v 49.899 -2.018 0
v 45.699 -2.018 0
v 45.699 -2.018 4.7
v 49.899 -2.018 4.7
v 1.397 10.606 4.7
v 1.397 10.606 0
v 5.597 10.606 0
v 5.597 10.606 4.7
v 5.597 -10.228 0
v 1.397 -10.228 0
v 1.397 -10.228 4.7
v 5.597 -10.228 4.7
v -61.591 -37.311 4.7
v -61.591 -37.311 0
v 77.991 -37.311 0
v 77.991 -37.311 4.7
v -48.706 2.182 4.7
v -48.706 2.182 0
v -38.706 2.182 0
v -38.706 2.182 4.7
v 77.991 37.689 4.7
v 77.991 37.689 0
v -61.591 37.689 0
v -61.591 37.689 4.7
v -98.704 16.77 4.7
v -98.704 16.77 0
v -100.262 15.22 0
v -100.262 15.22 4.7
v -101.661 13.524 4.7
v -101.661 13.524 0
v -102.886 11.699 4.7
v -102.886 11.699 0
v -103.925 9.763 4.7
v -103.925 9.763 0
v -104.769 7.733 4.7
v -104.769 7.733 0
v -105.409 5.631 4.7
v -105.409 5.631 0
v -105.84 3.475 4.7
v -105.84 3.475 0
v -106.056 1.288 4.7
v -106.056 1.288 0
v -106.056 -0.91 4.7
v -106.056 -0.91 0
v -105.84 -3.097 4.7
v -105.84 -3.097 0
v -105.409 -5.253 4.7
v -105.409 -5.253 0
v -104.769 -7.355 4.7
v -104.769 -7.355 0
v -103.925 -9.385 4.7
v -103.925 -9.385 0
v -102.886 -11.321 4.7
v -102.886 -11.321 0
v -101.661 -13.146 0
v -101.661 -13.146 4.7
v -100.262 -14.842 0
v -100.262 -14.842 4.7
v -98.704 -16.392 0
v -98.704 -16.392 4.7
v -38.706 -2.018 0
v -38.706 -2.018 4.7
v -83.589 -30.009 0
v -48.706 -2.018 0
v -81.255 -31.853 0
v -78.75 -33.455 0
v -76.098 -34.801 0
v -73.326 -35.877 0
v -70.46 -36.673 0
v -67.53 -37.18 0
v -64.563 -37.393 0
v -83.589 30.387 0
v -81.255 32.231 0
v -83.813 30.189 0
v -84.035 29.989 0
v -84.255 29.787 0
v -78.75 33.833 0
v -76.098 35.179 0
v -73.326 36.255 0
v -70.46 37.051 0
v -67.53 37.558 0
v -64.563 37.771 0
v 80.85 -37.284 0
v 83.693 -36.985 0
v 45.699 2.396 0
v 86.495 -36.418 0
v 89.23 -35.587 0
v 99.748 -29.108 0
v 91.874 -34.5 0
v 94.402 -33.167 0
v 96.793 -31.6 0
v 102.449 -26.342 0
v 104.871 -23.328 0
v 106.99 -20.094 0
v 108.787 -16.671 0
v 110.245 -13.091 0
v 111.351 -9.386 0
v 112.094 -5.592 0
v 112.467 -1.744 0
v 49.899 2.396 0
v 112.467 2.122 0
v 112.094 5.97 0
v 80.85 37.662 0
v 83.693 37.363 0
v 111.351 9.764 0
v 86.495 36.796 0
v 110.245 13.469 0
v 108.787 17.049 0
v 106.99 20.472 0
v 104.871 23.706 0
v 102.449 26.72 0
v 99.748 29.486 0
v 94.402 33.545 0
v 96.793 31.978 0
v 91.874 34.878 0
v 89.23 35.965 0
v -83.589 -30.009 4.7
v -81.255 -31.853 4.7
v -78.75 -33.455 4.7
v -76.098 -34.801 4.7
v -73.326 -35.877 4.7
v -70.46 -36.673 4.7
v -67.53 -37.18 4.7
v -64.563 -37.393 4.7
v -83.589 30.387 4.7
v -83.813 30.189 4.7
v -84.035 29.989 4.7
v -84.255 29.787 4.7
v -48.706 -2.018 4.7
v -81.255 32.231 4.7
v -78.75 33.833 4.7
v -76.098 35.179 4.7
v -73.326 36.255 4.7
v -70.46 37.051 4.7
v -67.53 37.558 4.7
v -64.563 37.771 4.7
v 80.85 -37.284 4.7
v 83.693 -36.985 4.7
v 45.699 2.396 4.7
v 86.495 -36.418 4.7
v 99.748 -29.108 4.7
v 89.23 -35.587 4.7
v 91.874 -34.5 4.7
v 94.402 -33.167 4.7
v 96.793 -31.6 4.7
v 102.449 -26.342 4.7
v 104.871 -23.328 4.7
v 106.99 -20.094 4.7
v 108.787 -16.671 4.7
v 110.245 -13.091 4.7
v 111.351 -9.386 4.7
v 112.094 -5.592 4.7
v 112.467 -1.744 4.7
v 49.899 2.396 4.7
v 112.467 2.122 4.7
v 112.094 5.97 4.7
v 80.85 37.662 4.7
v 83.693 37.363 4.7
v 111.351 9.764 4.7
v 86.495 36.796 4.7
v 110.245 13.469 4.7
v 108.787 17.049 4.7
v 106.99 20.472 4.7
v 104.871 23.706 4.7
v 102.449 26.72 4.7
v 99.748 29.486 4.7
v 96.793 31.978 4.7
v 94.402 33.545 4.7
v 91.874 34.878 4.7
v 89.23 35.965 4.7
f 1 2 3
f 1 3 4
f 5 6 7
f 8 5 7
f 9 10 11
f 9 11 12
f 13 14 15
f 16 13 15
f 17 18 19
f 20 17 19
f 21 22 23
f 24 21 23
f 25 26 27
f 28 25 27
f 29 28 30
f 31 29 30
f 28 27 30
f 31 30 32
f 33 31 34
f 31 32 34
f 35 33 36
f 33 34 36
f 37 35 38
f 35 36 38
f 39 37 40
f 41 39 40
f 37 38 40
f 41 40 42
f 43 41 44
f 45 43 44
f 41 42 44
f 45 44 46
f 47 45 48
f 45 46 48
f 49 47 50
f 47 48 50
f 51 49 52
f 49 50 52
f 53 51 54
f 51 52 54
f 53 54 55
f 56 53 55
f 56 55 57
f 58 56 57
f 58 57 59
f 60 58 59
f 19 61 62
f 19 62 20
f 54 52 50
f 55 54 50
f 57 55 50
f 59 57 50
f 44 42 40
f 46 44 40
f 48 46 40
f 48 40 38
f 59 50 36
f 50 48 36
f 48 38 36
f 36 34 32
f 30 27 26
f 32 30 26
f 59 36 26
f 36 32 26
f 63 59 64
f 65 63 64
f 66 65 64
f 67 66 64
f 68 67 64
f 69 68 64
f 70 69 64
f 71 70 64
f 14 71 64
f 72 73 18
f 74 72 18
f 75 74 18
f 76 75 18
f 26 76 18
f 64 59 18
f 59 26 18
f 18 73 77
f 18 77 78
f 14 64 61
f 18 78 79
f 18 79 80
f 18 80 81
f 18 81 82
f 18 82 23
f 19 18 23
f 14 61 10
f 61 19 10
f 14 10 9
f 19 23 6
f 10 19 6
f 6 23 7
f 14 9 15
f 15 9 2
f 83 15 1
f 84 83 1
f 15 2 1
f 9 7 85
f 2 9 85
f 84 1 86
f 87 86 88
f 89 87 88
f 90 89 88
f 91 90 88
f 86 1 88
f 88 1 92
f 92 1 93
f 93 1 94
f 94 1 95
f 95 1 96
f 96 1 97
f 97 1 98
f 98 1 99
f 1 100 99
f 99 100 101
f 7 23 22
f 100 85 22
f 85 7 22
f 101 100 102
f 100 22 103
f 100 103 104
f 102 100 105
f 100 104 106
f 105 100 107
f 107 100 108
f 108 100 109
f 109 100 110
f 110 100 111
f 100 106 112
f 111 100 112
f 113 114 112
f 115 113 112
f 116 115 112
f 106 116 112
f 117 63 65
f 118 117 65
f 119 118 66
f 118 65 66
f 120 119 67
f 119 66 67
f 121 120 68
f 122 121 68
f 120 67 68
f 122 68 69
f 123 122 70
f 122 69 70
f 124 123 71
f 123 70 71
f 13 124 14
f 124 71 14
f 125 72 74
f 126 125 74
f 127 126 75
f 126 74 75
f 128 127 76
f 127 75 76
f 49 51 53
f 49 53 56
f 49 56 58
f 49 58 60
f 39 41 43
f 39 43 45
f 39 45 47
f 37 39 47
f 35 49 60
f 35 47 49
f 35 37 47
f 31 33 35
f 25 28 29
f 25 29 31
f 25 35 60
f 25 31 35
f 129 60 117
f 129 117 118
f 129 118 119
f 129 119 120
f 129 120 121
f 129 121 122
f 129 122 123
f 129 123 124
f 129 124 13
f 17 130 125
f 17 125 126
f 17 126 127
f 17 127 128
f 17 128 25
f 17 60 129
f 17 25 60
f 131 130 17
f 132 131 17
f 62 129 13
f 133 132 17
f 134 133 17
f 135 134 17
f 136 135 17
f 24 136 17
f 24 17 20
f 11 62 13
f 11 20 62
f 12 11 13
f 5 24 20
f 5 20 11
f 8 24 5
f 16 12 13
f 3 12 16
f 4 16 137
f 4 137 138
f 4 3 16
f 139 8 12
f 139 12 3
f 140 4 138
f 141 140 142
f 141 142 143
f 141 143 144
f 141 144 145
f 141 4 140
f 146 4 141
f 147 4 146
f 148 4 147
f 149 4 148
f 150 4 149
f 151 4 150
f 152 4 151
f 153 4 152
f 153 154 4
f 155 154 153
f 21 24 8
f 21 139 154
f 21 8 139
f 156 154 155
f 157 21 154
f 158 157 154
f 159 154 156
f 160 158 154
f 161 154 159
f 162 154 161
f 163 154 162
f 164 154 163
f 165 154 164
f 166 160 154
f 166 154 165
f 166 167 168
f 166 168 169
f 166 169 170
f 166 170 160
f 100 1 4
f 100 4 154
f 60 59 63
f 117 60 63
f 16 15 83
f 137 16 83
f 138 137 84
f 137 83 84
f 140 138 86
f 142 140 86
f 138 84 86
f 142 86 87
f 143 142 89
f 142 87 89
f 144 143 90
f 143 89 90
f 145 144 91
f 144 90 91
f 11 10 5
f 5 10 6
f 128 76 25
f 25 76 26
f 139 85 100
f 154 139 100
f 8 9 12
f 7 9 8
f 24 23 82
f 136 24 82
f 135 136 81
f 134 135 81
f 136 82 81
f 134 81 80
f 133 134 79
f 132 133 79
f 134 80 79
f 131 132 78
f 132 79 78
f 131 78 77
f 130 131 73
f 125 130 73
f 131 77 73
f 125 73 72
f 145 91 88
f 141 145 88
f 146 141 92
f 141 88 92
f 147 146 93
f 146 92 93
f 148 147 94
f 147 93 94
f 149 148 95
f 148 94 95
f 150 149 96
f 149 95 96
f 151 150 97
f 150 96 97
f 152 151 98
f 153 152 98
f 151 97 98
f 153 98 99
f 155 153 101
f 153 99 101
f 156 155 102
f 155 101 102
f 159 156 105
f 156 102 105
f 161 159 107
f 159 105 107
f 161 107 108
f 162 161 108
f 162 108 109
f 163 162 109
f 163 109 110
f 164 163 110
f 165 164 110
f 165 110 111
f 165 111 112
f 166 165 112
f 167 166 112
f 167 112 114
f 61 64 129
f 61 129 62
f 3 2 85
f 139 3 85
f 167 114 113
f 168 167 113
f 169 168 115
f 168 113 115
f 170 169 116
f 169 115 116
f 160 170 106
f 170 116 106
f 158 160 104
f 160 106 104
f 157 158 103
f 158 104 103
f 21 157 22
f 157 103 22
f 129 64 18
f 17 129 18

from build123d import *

# Parameters (mm, degrees)
F0_W     = 10
F0_H     = 4.2
F0_W_2   = 4.2
F0_H_2   = 20.833439
F0_H_3   = 4.413291
F1_DEPTH = 4.7


with BuildPart() as f1:
    # F0 (on Top) → F1 (new body)
    with BuildSketch(Plane.XY):
        with BuildLine():
            Line((77.899866, 37.688946), (-61.590597, 37.688946))
            ThreePointArc((-61.590597, 37.688946), (-73.325816, 36.25533), (-83.589011, 30.386986))
            Line((-83.589011, 30.386986), (-84.255223, 29.786773))
            Line((-84.255223, 29.786773), (-98.703748, 16.769597))
            ThreePointArc((-98.703748, 16.769597), (-106.083018, 0.188949), (-98.703748, -16.3917))
            Line((-98.703748, -16.3917), (-83.589011, -30.009089))
            ThreePointArc((-83.589011, -30.009089), (-73.325816, -35.877432), (-61.590597, -37.311049))
            Line((-61.590597, -37.311049), (77.991385, -37.311049))
            ThreePointArc((77.991385, -37.311049), (87.872, -36.035201), (96.792933, -31.59997))
            ThreePointArc((96.792933, -31.59997), (112.514041, 0.188949), (96.792933, 31.977867))
            ThreePointArc((96.792933, 31.977867), (87.872, 36.413099), (77.991385, 37.688946))
            Line((77.991385, 37.688946), (77.899866, 37.688946))
        make_face()
        with Locations((-43.705713, 0.082303)):
            Rectangle(F0_W, F0_H, mode=Mode.SUBTRACT)
        with Locations((3.496545, 0.188949)):
            Rectangle(F0_W_2, F0_H_2, mode=Mode.SUBTRACT)
        with Locations((47.798803, 0.188948)):
            Rectangle(F0_W_2, F0_H_3, mode=Mode.SUBTRACT)
        with BuildLine():
            Line((-84.255223, 29.786773), (-83.589011, 30.386986))
            ThreePointArc((-83.589011, 30.386986), (-83.924366, 30.089376), (-84.255223, 29.786773))
        make_face()
    extrude(amount=F1_DEPTH)


solid = f1.part
